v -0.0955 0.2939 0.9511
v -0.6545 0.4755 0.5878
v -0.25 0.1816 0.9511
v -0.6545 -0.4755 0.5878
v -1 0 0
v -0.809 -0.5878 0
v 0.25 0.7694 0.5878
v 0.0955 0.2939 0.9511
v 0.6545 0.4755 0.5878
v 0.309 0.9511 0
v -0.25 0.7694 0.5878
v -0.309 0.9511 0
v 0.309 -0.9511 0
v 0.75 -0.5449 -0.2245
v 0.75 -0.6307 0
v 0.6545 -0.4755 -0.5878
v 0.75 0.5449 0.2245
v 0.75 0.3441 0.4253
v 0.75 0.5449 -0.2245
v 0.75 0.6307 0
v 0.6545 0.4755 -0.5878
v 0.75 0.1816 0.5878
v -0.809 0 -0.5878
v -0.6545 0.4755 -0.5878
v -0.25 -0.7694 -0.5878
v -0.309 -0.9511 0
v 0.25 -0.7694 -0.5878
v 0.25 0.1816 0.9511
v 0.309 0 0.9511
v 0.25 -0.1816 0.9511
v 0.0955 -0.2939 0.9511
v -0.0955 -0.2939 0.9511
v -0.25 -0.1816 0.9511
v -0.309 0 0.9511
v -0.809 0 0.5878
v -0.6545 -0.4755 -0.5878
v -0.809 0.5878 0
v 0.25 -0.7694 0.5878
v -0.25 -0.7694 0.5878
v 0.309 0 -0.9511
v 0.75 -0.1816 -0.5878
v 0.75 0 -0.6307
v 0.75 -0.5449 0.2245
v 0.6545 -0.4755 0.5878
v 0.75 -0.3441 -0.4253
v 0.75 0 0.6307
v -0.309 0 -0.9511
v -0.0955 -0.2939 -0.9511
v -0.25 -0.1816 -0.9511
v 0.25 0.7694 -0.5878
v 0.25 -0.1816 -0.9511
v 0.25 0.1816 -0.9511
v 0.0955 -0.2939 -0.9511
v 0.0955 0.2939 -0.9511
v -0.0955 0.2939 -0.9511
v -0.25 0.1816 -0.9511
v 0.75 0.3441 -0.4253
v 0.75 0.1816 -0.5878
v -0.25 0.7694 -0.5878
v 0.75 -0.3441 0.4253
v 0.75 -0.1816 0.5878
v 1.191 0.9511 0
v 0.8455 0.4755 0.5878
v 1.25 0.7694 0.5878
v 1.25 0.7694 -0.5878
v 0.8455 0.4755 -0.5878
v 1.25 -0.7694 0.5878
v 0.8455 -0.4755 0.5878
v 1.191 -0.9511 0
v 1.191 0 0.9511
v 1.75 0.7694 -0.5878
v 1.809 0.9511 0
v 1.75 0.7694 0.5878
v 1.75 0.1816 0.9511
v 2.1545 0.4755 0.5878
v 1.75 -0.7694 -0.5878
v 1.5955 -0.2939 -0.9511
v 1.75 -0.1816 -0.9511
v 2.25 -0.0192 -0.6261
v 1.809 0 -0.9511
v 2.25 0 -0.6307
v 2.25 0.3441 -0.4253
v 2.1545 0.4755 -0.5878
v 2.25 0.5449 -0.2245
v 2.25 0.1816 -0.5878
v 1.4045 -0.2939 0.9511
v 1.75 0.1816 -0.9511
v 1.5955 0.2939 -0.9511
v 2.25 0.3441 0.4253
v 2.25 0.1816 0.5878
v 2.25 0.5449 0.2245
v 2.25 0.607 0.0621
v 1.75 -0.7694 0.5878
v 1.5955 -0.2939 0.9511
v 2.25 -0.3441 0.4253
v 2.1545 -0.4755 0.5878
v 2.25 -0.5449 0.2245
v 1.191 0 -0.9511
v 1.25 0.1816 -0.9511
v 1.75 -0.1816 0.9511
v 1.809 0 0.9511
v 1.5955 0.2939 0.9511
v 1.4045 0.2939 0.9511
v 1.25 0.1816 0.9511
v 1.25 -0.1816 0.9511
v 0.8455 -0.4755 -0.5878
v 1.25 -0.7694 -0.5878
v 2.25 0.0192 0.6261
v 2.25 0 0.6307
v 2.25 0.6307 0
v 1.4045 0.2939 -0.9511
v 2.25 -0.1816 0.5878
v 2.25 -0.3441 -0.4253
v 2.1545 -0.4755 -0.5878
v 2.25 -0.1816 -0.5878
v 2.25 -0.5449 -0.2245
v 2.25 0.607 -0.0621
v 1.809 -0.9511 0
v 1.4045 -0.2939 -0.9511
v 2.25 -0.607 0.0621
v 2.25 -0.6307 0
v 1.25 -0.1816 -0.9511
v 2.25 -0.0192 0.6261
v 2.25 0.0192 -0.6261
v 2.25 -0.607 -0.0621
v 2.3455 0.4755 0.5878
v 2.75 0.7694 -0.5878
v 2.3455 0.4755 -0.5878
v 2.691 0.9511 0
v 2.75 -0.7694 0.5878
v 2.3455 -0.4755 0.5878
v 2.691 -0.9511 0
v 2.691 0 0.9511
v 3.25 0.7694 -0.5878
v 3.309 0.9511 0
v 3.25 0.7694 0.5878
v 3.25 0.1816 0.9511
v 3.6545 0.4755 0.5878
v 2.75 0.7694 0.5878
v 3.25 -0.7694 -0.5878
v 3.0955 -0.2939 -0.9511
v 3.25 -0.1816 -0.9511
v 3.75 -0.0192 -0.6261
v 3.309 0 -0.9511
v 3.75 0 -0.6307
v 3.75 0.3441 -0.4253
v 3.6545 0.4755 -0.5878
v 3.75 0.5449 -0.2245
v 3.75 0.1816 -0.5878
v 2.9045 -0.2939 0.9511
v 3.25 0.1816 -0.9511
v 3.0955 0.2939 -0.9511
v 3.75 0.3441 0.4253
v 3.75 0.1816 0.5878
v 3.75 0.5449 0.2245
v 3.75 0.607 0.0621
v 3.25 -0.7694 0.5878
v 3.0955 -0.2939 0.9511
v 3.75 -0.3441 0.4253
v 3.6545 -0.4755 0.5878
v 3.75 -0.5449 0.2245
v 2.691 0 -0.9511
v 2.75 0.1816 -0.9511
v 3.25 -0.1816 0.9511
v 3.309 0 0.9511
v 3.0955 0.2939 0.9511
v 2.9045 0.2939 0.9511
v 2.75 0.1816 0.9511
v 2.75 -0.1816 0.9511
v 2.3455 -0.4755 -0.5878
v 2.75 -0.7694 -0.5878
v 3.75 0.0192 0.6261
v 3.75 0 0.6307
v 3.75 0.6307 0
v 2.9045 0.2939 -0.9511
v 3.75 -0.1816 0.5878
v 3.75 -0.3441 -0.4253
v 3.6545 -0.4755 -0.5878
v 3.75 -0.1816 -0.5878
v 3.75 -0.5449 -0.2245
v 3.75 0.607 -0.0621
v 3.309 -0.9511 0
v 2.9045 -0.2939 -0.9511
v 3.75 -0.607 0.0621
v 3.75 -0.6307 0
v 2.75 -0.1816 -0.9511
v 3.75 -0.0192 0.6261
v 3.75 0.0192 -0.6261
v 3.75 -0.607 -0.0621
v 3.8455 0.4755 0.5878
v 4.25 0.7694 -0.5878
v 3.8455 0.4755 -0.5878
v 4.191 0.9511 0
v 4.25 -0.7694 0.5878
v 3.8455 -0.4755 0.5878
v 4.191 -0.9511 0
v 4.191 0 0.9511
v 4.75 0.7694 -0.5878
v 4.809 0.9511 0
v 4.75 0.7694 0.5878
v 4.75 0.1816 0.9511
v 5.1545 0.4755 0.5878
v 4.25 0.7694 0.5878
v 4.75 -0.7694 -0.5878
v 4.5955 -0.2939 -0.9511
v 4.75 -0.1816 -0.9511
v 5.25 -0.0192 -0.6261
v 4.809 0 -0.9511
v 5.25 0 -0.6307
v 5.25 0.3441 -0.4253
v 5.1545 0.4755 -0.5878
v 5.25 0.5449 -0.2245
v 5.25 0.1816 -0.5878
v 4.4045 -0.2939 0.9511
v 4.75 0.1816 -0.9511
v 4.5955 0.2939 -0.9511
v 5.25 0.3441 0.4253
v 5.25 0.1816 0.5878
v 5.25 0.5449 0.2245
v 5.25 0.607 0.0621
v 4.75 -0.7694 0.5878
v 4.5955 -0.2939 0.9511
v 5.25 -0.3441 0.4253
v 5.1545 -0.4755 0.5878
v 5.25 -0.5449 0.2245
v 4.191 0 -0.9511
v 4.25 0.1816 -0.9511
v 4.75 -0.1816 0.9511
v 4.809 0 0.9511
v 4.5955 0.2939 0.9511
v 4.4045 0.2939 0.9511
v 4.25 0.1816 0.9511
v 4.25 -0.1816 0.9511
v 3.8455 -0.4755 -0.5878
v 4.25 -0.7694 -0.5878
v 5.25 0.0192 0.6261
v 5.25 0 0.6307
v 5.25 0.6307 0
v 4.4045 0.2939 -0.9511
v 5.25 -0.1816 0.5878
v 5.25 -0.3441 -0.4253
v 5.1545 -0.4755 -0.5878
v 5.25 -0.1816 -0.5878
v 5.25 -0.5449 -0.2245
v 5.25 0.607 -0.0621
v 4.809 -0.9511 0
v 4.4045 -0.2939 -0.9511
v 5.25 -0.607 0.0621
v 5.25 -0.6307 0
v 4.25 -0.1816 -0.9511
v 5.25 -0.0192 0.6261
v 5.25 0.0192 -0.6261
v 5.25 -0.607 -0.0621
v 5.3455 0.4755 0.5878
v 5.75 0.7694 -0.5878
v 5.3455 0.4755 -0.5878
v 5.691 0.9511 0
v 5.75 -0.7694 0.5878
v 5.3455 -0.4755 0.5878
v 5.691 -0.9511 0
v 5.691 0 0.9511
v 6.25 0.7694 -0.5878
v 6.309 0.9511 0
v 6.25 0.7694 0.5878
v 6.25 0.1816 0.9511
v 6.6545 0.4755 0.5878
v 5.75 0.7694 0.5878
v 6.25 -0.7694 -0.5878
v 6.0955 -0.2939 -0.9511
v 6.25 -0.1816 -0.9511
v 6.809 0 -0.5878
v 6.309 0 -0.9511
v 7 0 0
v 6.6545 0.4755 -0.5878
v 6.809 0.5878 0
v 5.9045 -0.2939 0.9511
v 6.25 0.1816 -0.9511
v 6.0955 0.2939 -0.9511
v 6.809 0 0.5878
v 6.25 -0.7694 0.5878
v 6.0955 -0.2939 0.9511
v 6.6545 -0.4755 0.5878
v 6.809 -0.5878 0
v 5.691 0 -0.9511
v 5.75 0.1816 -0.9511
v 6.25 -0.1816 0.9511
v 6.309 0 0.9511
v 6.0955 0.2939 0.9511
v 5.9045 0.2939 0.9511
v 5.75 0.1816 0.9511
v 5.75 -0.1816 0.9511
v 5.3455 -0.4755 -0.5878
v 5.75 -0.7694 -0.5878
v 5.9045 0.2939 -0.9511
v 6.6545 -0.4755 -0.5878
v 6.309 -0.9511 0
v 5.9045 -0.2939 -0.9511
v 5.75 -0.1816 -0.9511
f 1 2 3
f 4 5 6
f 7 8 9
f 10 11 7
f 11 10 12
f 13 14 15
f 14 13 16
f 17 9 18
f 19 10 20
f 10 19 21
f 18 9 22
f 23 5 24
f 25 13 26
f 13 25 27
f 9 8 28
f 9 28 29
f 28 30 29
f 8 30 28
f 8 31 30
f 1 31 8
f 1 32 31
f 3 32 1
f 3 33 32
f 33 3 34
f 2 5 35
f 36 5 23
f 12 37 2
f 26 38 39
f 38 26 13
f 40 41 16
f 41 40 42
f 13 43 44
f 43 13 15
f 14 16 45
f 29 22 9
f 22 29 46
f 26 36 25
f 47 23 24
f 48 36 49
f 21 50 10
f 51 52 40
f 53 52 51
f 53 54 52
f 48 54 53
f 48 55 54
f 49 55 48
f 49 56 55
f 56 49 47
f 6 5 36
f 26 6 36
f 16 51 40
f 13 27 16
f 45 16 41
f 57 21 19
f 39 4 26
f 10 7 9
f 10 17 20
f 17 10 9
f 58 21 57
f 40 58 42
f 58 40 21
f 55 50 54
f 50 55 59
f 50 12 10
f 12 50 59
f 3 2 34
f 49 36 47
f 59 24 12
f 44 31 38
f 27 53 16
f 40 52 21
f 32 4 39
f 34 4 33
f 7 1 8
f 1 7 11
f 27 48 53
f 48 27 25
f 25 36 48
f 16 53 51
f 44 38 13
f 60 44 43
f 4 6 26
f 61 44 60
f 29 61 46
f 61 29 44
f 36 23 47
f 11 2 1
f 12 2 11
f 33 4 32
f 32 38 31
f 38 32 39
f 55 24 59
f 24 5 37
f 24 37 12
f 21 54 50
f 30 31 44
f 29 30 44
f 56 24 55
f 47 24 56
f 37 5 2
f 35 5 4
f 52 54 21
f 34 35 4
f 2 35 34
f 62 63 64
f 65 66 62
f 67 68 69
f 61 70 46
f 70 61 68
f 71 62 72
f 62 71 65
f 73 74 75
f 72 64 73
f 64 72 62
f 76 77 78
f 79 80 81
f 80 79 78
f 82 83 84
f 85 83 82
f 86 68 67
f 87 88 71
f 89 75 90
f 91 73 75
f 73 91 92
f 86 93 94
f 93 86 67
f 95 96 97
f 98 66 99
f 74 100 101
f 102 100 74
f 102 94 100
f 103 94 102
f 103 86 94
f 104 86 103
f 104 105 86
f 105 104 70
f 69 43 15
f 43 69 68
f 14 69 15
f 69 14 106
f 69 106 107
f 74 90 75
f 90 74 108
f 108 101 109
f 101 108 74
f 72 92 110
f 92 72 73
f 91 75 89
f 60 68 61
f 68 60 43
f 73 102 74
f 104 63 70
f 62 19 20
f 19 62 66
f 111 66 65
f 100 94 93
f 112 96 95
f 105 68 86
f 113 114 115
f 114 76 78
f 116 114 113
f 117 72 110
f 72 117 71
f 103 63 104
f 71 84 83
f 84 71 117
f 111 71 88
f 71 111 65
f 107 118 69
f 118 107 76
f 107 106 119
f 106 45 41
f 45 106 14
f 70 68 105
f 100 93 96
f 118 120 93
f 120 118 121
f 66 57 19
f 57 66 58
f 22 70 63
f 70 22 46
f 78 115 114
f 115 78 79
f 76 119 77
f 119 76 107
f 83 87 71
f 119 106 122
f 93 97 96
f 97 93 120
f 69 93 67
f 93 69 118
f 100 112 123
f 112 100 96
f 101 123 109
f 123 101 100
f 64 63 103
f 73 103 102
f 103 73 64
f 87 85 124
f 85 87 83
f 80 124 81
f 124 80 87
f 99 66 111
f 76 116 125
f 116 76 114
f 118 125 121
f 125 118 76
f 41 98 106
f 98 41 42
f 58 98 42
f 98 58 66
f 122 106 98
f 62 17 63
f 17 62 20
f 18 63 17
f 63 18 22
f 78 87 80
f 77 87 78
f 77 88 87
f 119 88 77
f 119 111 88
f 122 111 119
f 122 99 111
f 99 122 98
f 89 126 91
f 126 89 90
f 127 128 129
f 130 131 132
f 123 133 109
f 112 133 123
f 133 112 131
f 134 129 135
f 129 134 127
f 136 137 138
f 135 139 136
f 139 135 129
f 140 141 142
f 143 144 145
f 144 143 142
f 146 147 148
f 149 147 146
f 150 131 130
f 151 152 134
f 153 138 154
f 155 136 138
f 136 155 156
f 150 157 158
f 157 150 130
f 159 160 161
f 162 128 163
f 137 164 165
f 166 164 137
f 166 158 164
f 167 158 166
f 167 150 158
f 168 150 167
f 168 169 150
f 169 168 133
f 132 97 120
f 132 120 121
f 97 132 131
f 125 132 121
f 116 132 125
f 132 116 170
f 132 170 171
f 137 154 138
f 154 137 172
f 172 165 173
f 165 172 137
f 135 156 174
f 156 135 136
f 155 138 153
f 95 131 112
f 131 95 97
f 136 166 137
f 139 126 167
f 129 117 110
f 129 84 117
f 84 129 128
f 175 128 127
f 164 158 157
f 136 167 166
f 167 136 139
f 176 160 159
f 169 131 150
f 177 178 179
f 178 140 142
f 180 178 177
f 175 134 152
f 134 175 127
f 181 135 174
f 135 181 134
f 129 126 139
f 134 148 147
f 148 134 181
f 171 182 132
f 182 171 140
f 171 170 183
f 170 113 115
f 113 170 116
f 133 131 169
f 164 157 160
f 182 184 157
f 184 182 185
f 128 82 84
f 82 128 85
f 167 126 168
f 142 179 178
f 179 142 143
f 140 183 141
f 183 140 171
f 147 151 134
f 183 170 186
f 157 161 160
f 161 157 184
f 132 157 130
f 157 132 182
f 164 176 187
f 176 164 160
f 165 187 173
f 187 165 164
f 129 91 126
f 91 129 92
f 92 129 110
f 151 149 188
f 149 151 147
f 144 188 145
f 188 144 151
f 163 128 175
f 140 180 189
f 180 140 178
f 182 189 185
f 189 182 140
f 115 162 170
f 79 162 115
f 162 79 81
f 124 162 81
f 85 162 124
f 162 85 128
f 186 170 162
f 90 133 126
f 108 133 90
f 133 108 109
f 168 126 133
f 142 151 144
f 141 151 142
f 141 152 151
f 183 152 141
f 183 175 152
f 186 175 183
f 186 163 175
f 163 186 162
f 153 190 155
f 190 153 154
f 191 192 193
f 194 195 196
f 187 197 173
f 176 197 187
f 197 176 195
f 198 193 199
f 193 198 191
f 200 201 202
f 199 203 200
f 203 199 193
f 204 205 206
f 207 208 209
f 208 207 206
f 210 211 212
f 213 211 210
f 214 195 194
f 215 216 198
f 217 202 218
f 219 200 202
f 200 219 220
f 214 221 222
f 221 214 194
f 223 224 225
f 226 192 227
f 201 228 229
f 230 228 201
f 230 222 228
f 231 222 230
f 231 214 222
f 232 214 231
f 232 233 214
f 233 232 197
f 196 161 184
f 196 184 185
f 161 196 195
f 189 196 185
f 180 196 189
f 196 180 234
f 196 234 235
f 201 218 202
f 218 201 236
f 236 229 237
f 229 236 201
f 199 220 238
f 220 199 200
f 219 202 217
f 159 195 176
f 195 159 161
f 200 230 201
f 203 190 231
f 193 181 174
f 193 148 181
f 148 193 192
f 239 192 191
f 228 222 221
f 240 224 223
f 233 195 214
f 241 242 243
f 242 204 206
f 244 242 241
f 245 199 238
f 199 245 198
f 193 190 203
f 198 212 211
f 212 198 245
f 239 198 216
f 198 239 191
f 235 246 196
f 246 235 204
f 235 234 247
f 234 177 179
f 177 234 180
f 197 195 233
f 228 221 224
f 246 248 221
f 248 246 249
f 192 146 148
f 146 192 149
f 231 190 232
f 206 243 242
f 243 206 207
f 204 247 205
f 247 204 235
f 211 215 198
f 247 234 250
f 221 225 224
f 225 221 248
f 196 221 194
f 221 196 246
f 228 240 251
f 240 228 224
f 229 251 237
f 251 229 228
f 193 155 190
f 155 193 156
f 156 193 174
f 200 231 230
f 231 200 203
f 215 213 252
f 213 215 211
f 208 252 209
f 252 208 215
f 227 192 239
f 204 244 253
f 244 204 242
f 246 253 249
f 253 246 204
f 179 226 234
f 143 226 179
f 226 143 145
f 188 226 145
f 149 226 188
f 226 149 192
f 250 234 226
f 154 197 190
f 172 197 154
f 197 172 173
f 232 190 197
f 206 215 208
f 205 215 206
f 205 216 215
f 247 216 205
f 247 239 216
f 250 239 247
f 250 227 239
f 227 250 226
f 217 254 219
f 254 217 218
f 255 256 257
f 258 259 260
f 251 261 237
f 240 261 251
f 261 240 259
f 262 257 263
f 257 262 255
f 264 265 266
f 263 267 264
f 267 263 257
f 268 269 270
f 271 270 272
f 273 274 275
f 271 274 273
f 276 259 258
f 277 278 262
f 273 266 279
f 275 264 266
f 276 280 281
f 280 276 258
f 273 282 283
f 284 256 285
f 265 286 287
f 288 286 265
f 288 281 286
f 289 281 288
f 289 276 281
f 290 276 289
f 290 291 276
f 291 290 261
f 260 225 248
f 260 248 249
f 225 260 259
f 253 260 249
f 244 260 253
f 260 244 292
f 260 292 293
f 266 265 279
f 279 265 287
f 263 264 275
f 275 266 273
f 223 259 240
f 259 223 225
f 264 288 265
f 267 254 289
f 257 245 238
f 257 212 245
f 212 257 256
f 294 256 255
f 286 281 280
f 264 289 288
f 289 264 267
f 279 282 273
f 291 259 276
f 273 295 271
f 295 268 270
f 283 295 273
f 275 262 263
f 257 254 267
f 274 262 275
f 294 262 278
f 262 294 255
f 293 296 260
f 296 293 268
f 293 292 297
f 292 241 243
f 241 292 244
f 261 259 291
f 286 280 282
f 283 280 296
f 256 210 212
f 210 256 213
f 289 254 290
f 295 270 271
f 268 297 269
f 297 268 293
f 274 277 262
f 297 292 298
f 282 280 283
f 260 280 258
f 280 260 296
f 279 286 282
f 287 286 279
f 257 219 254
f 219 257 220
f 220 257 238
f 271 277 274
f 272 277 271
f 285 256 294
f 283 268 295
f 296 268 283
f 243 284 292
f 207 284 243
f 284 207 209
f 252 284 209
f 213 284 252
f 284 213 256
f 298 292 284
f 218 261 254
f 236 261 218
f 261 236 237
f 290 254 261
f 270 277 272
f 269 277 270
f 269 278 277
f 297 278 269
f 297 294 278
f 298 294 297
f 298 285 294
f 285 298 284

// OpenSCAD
// implicit union of a for loop
for (i = [0:4]) translate([i * 1.5, 0, 0]) sphere(1, $fn = 10);
